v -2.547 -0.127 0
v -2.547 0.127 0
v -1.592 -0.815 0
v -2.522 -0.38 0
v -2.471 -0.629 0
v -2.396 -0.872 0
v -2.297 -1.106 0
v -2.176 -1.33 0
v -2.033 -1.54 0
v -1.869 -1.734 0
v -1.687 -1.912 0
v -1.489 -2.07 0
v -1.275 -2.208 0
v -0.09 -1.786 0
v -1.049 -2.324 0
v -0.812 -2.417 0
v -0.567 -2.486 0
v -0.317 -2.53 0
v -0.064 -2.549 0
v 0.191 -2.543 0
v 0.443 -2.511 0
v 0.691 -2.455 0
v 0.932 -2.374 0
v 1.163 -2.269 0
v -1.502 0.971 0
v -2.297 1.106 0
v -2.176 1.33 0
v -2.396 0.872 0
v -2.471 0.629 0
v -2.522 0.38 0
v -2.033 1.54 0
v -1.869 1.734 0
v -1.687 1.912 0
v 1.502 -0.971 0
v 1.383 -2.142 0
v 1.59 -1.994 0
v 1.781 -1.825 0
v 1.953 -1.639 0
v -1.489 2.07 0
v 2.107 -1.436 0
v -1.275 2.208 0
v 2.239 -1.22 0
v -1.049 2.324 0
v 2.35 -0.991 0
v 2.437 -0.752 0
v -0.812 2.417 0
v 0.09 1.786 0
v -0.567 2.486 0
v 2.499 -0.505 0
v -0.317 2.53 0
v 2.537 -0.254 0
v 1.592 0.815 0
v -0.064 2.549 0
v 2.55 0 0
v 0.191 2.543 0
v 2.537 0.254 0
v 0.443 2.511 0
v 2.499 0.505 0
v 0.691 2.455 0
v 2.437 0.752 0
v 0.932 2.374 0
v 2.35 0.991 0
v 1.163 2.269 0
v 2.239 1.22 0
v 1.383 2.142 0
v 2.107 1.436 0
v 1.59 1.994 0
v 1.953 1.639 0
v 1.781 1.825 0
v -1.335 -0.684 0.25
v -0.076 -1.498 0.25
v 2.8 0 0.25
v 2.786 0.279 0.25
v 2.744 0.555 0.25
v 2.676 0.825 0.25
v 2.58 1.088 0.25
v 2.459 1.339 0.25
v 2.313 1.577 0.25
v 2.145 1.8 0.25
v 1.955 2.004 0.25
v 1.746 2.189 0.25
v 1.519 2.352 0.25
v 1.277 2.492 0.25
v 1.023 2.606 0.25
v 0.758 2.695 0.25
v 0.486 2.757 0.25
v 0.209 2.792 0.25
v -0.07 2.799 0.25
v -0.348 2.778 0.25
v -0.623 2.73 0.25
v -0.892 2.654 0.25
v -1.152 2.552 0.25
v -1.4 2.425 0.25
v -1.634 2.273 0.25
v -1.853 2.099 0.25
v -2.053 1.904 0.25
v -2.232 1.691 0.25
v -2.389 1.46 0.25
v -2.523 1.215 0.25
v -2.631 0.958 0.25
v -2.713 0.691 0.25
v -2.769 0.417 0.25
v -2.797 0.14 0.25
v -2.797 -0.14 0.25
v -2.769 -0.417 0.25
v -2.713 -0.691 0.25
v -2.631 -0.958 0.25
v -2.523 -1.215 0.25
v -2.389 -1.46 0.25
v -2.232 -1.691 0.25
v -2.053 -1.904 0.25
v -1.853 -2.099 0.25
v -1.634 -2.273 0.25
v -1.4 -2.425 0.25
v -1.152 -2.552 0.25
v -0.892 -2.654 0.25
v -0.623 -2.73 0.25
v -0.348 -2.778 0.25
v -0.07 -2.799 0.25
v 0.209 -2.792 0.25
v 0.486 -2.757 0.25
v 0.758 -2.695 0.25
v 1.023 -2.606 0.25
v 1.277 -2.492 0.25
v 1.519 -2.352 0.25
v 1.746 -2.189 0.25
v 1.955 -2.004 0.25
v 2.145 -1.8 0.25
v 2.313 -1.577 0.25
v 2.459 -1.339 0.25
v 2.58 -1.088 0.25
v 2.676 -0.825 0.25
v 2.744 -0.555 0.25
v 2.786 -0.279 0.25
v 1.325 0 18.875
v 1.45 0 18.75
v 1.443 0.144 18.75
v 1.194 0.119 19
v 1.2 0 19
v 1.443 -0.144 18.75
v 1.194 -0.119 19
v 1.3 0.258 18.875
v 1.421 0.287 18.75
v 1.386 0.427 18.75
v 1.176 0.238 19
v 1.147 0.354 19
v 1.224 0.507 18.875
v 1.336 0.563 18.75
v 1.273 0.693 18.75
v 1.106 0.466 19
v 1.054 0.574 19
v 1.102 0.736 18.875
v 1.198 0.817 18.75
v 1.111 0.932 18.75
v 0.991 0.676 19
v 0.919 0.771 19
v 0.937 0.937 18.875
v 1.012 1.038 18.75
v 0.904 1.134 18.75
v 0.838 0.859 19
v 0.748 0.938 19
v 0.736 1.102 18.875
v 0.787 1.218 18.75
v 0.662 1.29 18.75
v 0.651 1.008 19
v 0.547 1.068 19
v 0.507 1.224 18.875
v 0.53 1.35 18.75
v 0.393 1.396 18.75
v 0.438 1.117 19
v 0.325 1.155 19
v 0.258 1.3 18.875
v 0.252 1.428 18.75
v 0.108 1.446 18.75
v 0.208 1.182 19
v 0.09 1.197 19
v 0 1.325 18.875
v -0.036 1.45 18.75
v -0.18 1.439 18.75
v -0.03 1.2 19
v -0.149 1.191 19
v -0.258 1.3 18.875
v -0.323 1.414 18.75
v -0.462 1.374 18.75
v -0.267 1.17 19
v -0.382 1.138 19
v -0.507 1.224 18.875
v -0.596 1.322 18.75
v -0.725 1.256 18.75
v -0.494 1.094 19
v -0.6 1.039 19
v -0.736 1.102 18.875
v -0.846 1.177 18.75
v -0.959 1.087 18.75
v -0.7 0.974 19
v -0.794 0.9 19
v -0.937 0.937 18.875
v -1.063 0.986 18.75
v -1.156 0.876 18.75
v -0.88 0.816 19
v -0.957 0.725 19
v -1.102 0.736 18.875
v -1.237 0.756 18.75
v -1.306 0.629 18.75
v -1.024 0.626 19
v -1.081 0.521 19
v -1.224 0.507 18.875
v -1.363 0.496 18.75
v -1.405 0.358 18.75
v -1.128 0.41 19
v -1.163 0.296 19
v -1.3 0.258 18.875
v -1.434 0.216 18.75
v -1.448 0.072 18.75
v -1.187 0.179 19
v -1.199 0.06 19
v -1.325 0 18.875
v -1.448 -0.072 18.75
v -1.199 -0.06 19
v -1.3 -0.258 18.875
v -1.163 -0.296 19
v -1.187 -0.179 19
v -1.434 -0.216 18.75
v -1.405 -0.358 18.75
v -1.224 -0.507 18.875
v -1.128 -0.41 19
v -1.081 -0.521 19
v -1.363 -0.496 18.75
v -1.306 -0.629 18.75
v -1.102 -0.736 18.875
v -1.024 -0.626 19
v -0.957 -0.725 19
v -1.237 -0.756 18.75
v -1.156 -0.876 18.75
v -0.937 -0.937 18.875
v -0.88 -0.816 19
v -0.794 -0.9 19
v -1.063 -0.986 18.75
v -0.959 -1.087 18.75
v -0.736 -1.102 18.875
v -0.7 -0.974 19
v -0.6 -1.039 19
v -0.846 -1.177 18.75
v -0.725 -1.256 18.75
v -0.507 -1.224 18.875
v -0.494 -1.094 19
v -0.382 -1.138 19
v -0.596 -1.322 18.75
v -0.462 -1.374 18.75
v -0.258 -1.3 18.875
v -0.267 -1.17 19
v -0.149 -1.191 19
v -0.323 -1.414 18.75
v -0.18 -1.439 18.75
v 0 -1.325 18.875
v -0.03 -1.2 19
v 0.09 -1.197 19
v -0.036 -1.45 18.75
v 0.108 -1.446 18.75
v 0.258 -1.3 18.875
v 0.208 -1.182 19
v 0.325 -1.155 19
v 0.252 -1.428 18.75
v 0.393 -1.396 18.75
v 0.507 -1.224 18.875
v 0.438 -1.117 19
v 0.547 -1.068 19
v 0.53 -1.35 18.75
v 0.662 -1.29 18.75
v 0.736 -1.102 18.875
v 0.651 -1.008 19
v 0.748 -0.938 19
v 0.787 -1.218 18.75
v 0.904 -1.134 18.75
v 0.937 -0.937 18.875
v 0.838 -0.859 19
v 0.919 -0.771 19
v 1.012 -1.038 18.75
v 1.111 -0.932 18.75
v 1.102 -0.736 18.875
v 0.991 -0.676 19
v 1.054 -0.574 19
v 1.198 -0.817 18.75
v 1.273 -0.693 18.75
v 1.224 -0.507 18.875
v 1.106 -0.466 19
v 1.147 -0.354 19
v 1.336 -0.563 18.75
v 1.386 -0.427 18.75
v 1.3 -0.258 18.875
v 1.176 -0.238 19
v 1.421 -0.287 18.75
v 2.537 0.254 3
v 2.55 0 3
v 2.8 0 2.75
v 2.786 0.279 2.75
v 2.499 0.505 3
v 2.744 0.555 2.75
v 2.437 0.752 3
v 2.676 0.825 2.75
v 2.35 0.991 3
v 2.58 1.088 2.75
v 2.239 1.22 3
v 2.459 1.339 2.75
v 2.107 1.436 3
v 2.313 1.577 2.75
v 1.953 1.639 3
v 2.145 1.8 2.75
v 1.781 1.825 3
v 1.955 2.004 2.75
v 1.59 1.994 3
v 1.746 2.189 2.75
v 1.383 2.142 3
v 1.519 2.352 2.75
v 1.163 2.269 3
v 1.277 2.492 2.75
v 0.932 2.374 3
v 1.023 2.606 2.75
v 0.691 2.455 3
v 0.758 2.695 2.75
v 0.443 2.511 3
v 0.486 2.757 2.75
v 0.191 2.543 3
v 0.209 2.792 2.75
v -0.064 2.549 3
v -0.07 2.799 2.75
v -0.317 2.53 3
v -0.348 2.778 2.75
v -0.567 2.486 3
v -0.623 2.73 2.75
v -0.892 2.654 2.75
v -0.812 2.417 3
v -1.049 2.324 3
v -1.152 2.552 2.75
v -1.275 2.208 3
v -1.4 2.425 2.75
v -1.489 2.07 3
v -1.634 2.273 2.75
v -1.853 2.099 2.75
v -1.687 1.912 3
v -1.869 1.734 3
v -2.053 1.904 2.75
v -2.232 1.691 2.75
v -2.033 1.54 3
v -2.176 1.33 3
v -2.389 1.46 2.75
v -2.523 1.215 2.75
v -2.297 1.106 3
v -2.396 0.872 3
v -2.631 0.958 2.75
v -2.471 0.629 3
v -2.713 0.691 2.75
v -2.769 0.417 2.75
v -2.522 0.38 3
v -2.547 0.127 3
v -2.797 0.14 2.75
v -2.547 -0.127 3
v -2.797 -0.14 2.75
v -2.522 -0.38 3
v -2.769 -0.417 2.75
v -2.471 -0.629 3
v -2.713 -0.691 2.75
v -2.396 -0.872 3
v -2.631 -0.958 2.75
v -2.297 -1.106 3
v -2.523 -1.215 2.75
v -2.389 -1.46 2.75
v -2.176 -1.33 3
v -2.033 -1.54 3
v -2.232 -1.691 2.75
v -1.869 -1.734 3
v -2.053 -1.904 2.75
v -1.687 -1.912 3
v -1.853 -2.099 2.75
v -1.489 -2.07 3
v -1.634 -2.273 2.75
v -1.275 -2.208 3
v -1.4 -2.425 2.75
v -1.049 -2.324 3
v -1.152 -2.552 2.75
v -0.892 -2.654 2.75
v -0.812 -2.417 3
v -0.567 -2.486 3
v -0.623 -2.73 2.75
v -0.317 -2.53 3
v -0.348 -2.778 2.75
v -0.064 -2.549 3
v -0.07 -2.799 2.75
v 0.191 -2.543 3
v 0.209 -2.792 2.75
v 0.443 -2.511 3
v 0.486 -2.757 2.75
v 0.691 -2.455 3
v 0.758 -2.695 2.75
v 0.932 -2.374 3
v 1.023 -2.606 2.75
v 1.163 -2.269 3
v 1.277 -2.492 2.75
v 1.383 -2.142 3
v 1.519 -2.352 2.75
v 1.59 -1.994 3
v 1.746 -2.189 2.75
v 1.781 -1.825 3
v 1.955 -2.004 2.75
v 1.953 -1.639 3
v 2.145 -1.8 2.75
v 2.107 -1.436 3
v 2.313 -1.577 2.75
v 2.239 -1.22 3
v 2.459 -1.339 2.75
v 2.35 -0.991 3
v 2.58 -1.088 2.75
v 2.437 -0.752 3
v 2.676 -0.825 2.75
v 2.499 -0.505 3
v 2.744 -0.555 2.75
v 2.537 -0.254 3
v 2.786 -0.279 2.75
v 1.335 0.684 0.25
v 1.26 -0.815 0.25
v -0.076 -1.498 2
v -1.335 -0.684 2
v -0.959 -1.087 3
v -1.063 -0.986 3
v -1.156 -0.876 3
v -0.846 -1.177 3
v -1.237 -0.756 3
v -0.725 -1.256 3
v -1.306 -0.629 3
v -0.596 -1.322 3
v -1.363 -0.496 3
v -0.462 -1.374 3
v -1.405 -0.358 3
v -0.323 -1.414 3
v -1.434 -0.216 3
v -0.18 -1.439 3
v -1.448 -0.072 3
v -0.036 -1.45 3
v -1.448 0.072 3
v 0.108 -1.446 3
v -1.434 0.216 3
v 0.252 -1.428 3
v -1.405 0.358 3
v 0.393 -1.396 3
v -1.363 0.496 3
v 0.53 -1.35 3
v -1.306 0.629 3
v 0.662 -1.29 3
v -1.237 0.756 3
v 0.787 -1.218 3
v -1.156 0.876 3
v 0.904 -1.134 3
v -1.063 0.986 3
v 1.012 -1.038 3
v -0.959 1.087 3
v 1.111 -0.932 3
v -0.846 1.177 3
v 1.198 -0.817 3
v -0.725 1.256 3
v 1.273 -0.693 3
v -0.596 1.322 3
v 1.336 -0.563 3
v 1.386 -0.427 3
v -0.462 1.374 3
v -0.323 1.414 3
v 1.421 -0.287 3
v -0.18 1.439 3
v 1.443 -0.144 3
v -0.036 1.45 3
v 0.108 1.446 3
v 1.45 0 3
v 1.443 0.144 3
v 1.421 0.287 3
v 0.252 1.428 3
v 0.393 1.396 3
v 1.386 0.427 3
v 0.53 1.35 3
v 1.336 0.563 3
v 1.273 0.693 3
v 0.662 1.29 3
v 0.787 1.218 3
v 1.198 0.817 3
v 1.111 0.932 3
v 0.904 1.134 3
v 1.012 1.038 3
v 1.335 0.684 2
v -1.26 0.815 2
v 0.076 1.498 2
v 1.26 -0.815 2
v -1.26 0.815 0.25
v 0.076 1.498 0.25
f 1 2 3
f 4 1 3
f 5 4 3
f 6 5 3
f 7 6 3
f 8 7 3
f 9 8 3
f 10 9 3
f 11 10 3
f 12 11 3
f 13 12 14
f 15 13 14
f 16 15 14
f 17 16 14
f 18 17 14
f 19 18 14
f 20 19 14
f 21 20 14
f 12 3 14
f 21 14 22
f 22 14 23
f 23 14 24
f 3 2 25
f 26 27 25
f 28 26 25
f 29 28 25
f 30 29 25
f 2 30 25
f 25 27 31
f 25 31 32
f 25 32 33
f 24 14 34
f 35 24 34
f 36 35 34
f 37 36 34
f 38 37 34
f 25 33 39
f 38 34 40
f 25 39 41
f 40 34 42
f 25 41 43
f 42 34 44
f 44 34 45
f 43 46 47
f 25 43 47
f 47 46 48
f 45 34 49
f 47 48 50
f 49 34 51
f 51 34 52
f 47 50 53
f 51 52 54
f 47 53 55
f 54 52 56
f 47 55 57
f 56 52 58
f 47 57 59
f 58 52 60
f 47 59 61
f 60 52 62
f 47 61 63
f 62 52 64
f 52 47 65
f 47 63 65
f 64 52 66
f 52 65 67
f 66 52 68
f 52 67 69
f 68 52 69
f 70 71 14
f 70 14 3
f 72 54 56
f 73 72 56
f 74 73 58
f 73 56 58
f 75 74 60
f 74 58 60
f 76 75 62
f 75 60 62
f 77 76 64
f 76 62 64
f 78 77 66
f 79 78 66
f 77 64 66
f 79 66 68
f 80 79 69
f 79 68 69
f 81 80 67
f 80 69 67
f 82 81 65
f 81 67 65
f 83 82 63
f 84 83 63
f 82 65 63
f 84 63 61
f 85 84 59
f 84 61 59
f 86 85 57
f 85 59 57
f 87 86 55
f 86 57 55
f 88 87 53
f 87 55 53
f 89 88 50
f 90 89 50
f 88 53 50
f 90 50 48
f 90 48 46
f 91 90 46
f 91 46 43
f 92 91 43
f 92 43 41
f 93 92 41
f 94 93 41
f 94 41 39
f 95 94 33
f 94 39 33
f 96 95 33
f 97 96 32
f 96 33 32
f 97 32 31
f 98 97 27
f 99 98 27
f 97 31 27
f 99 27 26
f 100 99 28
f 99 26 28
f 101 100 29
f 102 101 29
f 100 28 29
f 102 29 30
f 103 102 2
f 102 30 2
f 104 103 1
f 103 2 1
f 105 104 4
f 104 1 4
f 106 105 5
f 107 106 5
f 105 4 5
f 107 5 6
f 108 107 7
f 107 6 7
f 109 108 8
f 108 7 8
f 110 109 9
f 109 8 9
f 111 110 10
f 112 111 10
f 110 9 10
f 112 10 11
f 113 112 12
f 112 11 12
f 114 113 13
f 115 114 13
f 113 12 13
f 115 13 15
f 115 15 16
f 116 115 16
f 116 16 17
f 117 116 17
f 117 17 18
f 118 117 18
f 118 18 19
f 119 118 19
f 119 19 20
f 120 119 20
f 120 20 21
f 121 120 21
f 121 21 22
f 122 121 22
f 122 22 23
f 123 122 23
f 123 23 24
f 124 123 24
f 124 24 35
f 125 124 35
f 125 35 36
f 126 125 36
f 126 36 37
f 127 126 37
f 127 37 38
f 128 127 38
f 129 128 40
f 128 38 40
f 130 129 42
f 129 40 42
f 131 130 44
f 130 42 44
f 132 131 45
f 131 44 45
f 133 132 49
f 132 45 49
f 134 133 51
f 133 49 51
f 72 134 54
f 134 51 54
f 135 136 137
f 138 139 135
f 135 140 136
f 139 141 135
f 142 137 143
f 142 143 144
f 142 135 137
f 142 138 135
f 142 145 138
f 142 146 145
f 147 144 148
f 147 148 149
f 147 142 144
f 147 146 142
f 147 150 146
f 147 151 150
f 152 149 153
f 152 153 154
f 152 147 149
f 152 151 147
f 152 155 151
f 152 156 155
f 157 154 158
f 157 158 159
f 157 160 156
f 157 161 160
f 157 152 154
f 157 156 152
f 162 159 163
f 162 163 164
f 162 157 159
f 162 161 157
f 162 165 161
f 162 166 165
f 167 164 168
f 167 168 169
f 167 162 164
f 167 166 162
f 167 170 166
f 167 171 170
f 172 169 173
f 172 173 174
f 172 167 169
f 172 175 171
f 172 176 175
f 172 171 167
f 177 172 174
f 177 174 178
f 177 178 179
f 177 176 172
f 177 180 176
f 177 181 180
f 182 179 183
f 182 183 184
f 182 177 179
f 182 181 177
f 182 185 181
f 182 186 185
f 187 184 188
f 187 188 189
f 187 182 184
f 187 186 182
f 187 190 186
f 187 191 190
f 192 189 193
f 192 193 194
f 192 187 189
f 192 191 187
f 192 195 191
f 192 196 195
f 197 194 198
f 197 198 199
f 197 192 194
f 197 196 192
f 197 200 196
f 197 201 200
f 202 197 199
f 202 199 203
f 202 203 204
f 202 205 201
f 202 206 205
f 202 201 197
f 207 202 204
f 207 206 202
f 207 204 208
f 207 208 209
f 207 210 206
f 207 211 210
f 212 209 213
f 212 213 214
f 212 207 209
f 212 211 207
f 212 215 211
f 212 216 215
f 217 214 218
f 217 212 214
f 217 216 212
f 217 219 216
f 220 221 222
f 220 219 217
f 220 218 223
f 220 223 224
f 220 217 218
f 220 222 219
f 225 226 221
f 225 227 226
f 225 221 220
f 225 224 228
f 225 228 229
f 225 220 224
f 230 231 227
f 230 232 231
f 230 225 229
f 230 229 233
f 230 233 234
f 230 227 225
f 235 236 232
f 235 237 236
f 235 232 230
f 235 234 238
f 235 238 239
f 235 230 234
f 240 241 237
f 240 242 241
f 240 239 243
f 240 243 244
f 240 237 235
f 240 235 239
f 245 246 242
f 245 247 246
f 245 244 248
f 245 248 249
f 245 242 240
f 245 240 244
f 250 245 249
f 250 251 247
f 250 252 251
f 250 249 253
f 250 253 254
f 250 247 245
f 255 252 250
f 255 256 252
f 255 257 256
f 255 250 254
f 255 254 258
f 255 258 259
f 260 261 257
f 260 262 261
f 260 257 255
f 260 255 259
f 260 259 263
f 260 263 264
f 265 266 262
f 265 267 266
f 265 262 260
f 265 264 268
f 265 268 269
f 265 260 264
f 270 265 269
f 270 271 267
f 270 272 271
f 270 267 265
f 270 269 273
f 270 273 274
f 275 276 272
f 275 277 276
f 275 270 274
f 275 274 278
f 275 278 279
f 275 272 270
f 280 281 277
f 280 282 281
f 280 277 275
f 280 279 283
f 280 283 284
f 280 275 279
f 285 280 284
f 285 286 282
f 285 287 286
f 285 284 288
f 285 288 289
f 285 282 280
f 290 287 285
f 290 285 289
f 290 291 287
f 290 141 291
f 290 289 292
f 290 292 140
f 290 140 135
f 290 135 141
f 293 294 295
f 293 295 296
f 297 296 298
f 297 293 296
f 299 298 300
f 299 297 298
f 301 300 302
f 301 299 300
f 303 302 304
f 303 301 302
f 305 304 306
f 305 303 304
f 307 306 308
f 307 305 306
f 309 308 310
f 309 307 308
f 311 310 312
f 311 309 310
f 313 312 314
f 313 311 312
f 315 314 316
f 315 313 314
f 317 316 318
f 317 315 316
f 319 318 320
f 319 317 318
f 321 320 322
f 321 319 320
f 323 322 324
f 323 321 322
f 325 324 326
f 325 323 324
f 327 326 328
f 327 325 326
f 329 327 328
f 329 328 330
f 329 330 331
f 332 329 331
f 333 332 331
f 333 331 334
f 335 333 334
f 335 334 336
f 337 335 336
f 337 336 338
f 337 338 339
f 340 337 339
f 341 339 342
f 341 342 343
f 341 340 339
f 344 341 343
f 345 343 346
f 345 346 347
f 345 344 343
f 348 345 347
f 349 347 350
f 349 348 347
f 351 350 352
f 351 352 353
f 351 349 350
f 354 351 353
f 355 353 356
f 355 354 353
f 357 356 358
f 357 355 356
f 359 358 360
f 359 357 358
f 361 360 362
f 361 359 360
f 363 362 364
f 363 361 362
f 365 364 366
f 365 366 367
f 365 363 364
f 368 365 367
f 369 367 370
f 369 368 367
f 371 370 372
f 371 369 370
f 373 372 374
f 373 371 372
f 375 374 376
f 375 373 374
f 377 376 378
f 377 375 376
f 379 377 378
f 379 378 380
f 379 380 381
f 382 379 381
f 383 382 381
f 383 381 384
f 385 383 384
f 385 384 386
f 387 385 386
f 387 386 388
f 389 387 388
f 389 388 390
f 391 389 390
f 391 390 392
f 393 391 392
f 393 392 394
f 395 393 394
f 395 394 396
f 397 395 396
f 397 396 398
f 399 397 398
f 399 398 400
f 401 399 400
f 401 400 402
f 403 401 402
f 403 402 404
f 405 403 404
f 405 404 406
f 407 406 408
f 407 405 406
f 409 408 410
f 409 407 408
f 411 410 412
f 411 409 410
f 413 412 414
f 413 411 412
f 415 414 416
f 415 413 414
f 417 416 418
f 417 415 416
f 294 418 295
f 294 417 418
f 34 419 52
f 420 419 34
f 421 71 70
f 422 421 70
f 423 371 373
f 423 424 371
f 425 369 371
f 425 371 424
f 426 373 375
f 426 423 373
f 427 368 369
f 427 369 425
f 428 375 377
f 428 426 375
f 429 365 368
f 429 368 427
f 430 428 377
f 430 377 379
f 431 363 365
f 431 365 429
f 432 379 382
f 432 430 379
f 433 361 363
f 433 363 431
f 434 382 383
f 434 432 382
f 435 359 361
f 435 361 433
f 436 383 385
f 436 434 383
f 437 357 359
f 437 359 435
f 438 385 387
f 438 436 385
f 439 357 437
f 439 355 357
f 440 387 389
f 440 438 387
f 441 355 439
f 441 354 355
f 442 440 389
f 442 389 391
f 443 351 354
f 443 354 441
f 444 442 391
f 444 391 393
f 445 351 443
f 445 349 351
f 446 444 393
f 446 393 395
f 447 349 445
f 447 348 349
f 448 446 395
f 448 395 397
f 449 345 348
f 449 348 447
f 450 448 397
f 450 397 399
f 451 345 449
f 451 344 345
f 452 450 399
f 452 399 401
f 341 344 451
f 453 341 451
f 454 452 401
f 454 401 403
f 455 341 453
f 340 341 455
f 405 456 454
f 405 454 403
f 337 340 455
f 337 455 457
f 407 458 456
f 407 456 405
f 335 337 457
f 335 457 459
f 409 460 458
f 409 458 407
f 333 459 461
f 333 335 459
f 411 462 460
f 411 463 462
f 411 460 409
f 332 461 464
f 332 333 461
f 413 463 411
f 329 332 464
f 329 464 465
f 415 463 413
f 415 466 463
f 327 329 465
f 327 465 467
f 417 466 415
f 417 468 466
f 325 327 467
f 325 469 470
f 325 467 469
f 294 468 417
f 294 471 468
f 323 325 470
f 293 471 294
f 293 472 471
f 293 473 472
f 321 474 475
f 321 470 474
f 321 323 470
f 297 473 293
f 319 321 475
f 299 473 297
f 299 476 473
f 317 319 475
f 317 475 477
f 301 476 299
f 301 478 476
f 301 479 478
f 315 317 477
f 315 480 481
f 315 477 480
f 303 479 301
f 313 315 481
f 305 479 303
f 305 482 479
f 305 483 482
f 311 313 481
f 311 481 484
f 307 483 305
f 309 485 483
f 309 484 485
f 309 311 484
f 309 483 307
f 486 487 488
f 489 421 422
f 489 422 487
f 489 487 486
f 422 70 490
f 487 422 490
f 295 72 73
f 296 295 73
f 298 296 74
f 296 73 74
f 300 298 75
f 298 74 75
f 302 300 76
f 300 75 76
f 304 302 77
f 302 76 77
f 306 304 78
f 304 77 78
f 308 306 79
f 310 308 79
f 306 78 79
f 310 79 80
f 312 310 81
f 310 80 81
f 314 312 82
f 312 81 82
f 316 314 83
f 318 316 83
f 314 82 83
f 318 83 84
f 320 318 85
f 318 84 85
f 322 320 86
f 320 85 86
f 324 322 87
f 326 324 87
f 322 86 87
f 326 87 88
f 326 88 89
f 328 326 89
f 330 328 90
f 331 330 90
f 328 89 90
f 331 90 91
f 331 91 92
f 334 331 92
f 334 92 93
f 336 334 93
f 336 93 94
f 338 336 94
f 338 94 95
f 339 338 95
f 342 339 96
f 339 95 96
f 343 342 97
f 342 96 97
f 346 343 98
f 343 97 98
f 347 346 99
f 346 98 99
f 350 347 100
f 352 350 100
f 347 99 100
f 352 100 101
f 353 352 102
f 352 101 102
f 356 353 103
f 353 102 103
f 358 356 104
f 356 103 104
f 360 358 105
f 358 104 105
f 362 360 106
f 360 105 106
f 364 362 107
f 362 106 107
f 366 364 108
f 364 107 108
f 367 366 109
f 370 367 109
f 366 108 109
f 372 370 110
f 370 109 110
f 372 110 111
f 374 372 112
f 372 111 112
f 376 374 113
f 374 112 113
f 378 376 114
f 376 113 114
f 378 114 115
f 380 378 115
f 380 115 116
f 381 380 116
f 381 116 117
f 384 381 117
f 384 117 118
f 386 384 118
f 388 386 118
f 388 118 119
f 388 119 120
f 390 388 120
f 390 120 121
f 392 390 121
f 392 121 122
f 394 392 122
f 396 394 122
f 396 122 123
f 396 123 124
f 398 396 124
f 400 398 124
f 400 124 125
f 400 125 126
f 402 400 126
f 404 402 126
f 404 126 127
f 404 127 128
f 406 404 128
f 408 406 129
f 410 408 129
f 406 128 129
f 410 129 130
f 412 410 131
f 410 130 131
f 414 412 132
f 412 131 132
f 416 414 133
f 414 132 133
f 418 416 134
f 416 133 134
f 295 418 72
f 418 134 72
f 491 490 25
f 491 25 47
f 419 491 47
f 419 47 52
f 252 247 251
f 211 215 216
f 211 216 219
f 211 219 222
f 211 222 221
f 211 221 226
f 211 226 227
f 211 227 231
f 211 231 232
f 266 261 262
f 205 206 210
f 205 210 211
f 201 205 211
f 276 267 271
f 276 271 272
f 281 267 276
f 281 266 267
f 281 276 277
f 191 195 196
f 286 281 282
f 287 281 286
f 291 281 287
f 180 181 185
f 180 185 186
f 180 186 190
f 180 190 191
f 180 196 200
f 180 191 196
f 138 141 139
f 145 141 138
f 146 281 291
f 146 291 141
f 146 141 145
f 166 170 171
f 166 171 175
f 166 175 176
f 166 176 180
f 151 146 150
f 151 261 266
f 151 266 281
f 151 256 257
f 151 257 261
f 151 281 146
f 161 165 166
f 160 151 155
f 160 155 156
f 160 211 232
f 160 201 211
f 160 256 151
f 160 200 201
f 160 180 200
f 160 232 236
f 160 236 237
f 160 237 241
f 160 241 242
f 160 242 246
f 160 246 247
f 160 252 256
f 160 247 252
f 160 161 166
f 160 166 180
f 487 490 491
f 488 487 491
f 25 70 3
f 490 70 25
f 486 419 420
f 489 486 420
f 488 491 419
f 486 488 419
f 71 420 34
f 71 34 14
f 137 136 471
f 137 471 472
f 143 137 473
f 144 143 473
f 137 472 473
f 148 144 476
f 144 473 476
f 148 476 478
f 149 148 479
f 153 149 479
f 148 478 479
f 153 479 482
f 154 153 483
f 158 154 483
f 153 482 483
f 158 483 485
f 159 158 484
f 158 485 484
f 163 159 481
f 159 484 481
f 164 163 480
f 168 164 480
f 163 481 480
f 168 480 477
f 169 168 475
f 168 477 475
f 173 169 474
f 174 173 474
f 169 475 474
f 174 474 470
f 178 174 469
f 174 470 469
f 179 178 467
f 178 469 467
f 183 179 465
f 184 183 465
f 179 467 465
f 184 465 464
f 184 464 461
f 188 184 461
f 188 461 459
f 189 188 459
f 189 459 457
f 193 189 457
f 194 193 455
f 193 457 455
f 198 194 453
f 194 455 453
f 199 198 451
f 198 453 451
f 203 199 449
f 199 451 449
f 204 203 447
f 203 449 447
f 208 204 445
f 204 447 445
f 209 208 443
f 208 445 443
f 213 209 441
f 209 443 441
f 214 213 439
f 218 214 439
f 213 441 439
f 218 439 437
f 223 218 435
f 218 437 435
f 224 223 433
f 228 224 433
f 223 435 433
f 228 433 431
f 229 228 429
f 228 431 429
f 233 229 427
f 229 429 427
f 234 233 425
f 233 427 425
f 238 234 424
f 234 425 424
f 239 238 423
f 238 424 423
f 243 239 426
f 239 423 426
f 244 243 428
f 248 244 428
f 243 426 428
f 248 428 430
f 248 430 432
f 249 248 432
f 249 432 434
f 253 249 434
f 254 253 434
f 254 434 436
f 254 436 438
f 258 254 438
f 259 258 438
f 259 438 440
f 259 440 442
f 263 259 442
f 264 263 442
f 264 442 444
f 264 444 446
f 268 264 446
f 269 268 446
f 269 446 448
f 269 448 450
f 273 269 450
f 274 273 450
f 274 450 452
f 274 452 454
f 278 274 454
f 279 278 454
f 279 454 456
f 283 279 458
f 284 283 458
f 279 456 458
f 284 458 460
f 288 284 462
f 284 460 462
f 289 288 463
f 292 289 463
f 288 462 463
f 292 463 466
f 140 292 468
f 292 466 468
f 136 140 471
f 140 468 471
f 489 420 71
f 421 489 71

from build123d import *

# Parameters (mm, degrees)
SKETCH_R     = 2.8
PAD_DEPTH    = 3
SKETCH001_R  = 1.45
PAD001_DEPTH = 16
POCKET_DEPTH = 2
CHAMFER_SIZE = 0.25


with BuildPart() as part:
    # Sketch → Pad (new body)
    with BuildSketch(Plane.XY):
        Circle(SKETCH_R)
    extrude(amount=PAD_DEPTH)

    # Sketch001 (on Face3 of Pad) → Pad001 (join)
    with BuildSketch(Plane.XY.offset(3)):
        Circle(SKETCH001_R)
    extrude(amount=PAD001_DEPTH)

    # Sketch002 (on Face2 of Pad001) → Pocket (cut)
    with BuildSketch(Plane(origin=(0, 0, 0), x_dir=(1, 0, 0), z_dir=(0, 0, -1))):
        Polygon((1.259542, 0.814588), (-0.075682, 1.49809), (-1.335225, 0.683502), (-1.259542, -0.814588), (0.075682, -1.49809), (1.335225, -0.683502), align=None)
    extrude(amount=-POCKET_DEPTH, mode=Mode.SUBTRACT)

    # Chamfer
    chamfer_edges = [part.edges().sort_by_distance(p)[0] for p in [
        (-2.8, 0, 3),
        (-2.8, 0, 0),
        (1.297384, -0.065543, 0),
        (0.705454, 1.090796, 0),
        (-0.59193, 1.156339, 0),
        (-1.297384, 0.065543, 0),
        (-0.705454, -1.090796, 0),
        (0.59193, -1.156339, 0),
        (-1.45, 0, 19),
    ]]
    chamfer(chamfer_edges, length=CHAMFER_SIZE)


solid = part.part
